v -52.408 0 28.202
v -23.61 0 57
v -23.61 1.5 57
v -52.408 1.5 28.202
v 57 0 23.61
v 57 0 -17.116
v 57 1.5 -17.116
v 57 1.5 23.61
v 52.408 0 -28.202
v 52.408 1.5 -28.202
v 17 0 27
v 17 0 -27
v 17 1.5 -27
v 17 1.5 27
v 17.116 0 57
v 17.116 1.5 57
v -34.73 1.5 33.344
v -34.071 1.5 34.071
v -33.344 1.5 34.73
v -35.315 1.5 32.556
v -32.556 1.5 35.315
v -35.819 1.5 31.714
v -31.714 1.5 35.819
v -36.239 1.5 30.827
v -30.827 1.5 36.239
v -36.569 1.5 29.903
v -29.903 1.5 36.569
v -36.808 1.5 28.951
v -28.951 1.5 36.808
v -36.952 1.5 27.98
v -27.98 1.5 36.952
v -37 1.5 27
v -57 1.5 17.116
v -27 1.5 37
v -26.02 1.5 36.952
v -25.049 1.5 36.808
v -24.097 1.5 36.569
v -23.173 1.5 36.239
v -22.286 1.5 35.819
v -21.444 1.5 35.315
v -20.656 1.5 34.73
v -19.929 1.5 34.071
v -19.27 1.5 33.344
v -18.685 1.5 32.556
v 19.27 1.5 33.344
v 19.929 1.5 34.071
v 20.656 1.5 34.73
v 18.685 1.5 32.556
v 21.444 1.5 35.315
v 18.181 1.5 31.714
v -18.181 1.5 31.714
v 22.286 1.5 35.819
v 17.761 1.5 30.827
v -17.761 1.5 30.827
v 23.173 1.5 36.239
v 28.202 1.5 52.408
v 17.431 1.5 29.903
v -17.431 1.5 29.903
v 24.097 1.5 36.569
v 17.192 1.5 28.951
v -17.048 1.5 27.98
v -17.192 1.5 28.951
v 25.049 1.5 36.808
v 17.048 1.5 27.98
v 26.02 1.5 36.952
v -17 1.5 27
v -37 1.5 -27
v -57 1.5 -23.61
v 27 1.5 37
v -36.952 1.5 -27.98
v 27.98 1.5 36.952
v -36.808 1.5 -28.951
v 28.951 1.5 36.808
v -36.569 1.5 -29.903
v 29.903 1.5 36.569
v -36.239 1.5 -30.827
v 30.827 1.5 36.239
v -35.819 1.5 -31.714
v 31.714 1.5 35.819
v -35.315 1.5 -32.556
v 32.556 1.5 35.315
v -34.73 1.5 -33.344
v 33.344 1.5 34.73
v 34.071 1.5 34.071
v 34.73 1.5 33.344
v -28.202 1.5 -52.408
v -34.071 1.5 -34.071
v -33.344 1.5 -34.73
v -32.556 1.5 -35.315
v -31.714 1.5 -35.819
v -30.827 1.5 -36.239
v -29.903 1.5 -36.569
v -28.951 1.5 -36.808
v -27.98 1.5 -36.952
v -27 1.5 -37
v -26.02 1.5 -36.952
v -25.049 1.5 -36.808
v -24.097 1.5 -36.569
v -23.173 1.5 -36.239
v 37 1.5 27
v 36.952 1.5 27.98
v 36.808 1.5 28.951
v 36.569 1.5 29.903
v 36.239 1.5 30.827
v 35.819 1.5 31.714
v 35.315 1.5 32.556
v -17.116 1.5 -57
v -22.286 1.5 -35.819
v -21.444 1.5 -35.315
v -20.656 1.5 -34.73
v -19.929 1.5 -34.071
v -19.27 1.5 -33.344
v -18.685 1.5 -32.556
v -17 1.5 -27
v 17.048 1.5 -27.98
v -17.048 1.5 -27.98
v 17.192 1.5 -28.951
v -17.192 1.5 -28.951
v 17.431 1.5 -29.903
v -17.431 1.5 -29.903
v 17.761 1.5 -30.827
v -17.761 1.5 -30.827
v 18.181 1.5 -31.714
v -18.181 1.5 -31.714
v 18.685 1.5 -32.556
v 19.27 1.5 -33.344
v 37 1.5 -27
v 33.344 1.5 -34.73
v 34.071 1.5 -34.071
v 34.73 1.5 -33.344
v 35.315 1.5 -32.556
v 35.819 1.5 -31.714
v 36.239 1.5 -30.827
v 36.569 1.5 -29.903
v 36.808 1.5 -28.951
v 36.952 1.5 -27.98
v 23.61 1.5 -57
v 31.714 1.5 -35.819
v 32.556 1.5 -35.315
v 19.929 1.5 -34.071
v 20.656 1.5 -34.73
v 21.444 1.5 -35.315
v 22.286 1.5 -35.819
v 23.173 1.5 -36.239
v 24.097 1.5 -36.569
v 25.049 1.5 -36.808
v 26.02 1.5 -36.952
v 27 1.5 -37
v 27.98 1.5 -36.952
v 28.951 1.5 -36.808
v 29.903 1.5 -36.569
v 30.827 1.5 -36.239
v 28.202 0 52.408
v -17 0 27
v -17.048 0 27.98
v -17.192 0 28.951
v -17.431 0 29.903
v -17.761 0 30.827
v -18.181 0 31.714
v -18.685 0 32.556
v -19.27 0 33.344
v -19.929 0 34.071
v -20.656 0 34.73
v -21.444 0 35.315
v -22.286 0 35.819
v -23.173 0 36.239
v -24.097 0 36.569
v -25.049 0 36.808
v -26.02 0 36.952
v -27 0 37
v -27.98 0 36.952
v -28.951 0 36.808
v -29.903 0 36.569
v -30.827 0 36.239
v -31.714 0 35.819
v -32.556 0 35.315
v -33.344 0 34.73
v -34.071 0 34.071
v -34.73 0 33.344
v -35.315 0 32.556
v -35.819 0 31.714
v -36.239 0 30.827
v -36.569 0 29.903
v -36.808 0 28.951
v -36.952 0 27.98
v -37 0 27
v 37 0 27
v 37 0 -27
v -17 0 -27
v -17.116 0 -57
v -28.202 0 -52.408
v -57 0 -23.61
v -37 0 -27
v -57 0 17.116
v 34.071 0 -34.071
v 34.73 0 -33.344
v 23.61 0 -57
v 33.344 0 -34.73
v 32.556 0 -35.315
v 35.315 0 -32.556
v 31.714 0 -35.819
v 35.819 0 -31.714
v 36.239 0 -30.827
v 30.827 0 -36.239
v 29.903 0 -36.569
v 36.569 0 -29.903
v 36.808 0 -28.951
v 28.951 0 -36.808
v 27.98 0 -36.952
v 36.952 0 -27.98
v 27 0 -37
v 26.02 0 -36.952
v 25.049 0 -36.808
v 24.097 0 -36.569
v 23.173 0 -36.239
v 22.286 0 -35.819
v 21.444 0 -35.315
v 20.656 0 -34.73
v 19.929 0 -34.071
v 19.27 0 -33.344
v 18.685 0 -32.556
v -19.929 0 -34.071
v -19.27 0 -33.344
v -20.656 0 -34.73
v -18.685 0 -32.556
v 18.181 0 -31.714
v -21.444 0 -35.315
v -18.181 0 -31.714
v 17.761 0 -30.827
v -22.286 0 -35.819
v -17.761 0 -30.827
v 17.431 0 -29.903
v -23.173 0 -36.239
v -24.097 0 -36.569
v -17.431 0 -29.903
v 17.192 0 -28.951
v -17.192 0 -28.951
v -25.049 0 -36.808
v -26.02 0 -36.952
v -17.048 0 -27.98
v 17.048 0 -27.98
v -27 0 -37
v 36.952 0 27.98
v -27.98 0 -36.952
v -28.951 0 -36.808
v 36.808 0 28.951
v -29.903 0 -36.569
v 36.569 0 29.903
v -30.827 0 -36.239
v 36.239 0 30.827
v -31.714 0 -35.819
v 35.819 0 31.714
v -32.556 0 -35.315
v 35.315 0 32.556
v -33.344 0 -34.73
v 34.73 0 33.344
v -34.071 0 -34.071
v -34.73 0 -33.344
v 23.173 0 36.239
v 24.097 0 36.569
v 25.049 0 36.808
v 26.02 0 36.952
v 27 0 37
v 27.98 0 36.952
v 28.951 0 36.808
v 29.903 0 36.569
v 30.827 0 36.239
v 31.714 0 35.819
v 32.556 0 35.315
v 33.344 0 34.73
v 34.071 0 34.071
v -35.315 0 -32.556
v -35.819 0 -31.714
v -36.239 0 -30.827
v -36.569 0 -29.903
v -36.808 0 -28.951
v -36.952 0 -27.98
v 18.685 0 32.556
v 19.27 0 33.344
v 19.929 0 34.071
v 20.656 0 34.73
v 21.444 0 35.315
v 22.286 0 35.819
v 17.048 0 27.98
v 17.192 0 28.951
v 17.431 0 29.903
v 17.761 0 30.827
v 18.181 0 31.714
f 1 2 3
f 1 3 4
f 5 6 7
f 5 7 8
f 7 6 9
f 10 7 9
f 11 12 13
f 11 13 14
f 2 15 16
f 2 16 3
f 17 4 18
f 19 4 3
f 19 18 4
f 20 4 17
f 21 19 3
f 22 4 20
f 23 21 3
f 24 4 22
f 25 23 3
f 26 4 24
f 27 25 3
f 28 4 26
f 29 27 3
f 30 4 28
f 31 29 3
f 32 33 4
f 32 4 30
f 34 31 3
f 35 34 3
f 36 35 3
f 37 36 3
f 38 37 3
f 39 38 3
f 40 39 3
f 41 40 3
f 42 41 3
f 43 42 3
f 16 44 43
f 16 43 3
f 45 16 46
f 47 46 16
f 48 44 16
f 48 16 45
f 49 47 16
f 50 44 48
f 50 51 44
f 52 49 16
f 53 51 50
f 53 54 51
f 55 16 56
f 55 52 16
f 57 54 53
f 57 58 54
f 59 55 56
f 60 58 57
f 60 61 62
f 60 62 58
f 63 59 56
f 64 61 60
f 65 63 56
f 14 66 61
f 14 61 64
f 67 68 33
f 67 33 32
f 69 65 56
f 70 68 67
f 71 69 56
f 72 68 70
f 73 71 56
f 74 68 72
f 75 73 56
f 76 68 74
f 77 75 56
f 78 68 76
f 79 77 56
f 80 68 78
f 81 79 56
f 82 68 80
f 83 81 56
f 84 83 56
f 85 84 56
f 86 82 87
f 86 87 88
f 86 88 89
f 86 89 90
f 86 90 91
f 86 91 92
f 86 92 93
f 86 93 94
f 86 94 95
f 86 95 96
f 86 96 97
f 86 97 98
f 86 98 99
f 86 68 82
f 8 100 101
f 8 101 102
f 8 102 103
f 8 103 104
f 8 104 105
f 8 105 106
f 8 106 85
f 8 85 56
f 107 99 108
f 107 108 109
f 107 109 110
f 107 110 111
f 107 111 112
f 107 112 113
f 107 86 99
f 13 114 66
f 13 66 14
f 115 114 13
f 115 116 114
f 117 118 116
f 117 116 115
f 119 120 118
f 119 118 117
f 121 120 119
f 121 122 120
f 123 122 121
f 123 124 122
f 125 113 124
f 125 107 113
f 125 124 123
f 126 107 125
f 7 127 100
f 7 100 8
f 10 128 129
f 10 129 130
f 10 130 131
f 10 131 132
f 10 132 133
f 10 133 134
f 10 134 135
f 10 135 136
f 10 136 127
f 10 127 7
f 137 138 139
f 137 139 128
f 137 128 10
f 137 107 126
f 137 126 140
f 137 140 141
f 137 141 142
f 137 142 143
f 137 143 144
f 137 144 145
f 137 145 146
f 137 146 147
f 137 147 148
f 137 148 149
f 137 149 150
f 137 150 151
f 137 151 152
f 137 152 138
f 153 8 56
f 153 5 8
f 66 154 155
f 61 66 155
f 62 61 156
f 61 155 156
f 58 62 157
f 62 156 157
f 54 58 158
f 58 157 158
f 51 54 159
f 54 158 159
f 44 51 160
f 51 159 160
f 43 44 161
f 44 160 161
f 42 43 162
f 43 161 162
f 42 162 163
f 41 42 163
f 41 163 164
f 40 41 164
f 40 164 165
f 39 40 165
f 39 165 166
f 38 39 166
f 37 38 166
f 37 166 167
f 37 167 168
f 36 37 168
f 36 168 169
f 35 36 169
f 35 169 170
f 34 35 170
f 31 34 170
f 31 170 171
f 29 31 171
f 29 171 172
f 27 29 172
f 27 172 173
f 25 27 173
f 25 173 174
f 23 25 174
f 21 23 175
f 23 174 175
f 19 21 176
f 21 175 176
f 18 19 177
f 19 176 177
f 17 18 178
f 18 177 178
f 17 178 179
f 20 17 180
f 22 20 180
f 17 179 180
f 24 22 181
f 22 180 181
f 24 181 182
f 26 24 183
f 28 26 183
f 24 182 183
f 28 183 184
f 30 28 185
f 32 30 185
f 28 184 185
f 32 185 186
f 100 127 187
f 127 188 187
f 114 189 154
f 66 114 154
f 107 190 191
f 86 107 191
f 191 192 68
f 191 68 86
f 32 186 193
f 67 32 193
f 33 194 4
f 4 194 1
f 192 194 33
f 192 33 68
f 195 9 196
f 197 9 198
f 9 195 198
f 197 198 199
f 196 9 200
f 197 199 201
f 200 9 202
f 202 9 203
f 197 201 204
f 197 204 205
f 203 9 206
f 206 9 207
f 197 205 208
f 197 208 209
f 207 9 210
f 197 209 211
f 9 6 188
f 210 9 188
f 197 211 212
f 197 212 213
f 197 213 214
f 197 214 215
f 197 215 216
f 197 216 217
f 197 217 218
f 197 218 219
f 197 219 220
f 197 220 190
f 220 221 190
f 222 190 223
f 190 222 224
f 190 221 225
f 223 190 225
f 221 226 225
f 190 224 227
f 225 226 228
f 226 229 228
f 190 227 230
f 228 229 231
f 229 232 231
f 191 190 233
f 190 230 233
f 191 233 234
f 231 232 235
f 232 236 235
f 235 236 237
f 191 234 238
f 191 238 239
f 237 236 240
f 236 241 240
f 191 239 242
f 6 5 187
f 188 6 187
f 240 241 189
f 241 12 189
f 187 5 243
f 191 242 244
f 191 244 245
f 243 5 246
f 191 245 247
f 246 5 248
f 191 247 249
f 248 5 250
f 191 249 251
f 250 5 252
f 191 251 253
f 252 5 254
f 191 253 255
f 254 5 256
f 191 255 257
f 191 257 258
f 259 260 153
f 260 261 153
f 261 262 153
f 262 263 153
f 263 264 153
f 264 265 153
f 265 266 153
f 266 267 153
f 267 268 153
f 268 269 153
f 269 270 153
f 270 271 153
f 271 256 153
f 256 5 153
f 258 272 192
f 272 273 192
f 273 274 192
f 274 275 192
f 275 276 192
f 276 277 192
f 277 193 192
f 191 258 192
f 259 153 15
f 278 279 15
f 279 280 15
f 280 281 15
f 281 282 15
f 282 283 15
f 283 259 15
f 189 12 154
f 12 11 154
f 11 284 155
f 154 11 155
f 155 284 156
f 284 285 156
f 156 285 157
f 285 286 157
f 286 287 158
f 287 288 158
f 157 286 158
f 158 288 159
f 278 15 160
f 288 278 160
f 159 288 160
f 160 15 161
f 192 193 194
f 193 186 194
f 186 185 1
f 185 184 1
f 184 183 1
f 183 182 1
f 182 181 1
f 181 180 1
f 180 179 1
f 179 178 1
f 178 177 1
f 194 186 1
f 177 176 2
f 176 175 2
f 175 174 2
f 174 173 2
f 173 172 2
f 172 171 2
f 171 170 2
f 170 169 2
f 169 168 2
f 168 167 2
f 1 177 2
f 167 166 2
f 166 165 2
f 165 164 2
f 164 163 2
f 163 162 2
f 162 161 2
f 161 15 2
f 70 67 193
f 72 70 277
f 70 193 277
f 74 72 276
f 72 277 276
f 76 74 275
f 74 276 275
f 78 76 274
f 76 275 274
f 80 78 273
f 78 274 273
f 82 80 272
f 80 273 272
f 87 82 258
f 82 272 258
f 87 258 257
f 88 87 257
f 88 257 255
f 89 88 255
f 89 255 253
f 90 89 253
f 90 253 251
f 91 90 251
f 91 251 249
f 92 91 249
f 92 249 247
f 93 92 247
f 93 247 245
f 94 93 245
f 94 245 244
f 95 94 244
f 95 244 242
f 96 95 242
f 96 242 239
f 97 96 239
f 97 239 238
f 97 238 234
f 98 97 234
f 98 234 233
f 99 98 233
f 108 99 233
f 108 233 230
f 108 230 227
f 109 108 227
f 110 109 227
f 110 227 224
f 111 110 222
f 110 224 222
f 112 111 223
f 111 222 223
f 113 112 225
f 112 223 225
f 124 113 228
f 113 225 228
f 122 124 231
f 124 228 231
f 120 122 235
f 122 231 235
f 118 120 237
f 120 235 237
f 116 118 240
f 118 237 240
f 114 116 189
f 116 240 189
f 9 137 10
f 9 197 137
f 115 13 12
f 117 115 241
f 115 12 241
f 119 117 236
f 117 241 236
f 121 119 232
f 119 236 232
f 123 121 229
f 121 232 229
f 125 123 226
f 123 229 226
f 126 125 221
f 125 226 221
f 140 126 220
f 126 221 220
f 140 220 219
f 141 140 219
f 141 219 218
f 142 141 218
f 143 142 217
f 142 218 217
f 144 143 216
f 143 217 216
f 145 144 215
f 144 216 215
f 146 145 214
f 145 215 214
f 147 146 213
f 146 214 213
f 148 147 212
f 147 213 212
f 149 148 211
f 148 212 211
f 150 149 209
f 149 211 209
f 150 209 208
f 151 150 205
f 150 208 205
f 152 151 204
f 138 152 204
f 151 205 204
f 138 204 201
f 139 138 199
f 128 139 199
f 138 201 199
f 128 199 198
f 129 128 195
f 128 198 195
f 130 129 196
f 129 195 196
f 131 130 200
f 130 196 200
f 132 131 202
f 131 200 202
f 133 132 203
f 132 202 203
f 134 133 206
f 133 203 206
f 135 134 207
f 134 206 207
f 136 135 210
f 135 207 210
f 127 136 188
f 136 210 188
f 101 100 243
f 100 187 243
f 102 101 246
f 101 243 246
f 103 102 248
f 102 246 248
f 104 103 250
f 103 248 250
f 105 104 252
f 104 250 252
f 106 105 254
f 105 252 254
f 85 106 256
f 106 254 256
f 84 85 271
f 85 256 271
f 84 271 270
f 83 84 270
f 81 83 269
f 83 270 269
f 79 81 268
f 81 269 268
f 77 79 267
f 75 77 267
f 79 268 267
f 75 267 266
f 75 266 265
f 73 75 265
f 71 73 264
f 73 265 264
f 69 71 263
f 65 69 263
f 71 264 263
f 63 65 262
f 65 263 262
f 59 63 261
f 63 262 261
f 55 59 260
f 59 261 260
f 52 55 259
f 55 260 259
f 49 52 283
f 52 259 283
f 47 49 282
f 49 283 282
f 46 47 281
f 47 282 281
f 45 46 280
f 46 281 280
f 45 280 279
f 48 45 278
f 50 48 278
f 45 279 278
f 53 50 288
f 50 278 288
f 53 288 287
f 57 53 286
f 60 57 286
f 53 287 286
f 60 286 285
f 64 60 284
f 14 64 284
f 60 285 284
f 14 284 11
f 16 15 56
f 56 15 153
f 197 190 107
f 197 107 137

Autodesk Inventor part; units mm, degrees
ref_plane "YZ Plane" through (0, 0, 0) normal (1, 0, 0) x (0, 1, 0)
ref_plane "XZ Plane" through (0, 0, 0) normal (0, 1, 0) x (-1, 0, 0)
ref_plane "XY Plane" through (0, 0, 0) normal (0, 0, 1) x (1, 0, 0)
sketch "Skizze4" plane through (0, 0, 0) normal (0, 1, 0) x (-1, 0, 0)
  line L0 (-23.6102, 57) -> (23.6102, 57)
  line L1 (23.6102, 57) -> (57, 23.6102)
  line L2 (57, 23.6102) -> (57, -23.6102)
  line L3 (57, -23.6102) -> (23.6102, -57)
  line L4 (23.6102, -57) -> (-23.6102, -57)
  line L5 (-23.6102, -57) -> (-57, -23.6102)
  line L6 (-57, -23.6102) -> (-57, 23.6102)
  line L7 (-57, 23.6102) -> (-23.6102, 57)
  line L8 (79.8, 0) -> (-79.8, 0) construction
  line L9 (0, -79.8) -> (0, 79.8) construction
  circle A0 centre (-27, 27) radius 10
  circle A1 centre (-27, -27) radius 10
  circle A2 centre (27, -27) radius 10
  circle A3 centre (27, 27) radius 10
  point P0 (0, 0)
  point P1 (0, 0)
  dimension "d4" = 114
  dimension "d5" = 20
  dimension "d6" = 30
  dimension "d7" = 30
  dimension "d10" = 360
extrude "Extrusion2" add sketch "Skizze4" along normal blind 2.5
sketch "Skizze5" plane through (0, 0, 0) normal (0, -1, 0) x (1, 0, 0)
  circle A0 centre (-27, 27) radius 10 construction
  circle A1 centre (-27, -27) radius 10 construction
  circle A2 centre (27, -27) radius 10 construction
  circle A3 centre (27, 27) radius 10 construction
  line L0 (23.6102, 57) -> (-23.6102, 57) construction
  line L1 (-23.6102, 57) -> (-57, 23.6102) construction
  line L2 (-57, 23.6102) -> (-57, -23.6102) construction
  line L3 (-57, -23.6102) -> (-23.6102, -57) construction
  line L4 (-23.6102, -57) -> (23.6102, -57) construction
  line L5 (23.6102, -57) -> (57, -23.6102) construction
  line L6 (57, -23.6102) -> (57, 23.6102) construction
  line L7 (57, 23.6102) -> (23.6102, 57) construction
  line L8 (23.6102, 57) -> (57, 23.6102) construction
  line L9 (-57, -23.6102) -> (-57, 23.6102) construction
  line L10 (-23.6102, -57) -> (-57, -23.6102) construction
  line L11 (23.6102, -57) -> (-23.6102, -57) construction
  line L12 (57, 23.6102) -> (57, -23.6102) construction
  line L13 (-57, 17.1158) -> (-52.4078, 28.2024)
  line L14 (-57, 23.6102) -> (-23.6102, 57) projected
  line L15 (-57, 23.6102) -> (-57, -23.6102) projected
  line L16 (-57, 23.6102) -> (-52.4078, 28.2024)
  line L17 (-23.6102, 57) -> (-57, 23.6102) projected
  line L18 (-57, 23.6102) -> (-57, 17.1158)
  line L19 (-23.6102, -57) -> (-28.2024, -52.4078)
  line L20 (-17.1158, -57) -> (-28.2024, -52.4078)
  line L21 (-23.6102, -57) -> (-17.1158, -57)
  line L22 (57, -23.6102) -> (52.4078, -28.2024)
  line L23 (57, -17.1158) -> (52.4078, -28.2024)
  line L24 (57, -23.6102) -> (57, -17.1158)
  line L25 (23.6102, 57) -> (28.2024, 52.4078)
  line L26 (17.1158, 57) -> (28.2024, 52.4078)
  line L27 (23.6102, 57) -> (17.1158, 57)
  point P0 (0, 0)
  dimension "d21" = 22.5
  dimension "d22" = 12
  dimension "d25" = 360
extrude "Extrusion3" cut sketch "Skizze5" against normal blind 10
sketch "Skizze6" plane through (0, 2.5, 0) normal (0, 1, 0) x (1, 0, 0)
  line L0 (57, 17.1158) -> (52.4078, 28.2024) projected
  line L1 (52.4078, 28.2024) -> (23.6102, 57) projected
  line L2 (23.6102, 57) -> (-17.1158, 57) projected
  line L3 (-17.1158, 57) -> (-28.2024, 52.4078) projected
  line L4 (-28.2024, 52.4078) -> (-57, 23.6102) projected
  line L5 (-57, 23.6102) -> (-57, -17.1158) projected
  line L6 (-57, -17.1158) -> (-52.4078, -28.2024) projected
  line L7 (-52.4078, -28.2024) -> (-23.6102, -57) projected
  line L8 (-23.6102, -57) -> (17.1158, -57) projected
  line L9 (17.1158, -57) -> (28.2024, -52.4078) projected
  line L10 (28.2024, -52.4078) -> (57, -23.6102) projected
  line L11 (57, -23.6102) -> (57, 17.1158) projected
  circle A0 centre (-27, -27) radius 10 projected
  circle A1 centre (-27, 27) radius 10 projected
  circle A2 centre (27, 27) radius 10 projected
  circle A3 centre (27, -27) radius 10 projected
  point P0 (0, 0)
extrude "Extrusion4" cut sketch "Skizze6" against normal blind 1
sketch "Skizze7" plane through (0, 0, 0) normal (0, -1, 0) x (1, 0, 0)
  line L0 (52.4078, -28.2024) -> (57, -17.1158) construction
  line L1 (57, -17.1158) -> (57, 23.6102) construction
  line L2 (57, 23.6102) -> (28.2024, 52.4078) construction
  line L3 (28.2024, 52.4078) -> (17.1158, 57) construction
  line L4 (17.1158, 57) -> (-23.6102, 57) construction
  line L5 (-23.6102, 57) -> (-52.4078, 28.2024) construction
  line L6 (-52.4078, 28.2024) -> (-57, 17.1158) construction
  line L7 (-57, 17.1158) -> (-57, -23.6102) construction
  line L8 (-57, -23.6102) -> (-28.2024, -52.4078) construction
  line L9 (-28.2024, -52.4078) -> (-17.1158, -57) construction
  line L10 (-17.1158, -57) -> (23.6102, -57) construction
  line L11 (23.6102, -57) -> (52.4078, -28.2024) construction
  circle A0 centre (-27, 27) radius 10 construction
  circle A1 centre (-27, -27) radius 10 construction
  circle A2 centre (27, -27) radius 10 construction
  circle A3 centre (27, 27) radius 10 construction
  line L12 (-37, 27) -> (-37, -27)
  circle A4 centre (-27, -27) radius 10 projected
  line L13 (-17, -27) -> (-17, 27)
  line L14 (37, -27) -> (37, 27)
  line L15 (17, -27) -> (17, 27)
  circle A5 centre (27, 27) radius 10 projected
  arc A6 (-17, 27) -> (-37, 27) centre (-27, 27) ccw
  arc A7 (37, 27) -> (17, 27) centre (27, 27) ccw
  circle A8 centre (27, -27) radius 10 projected
  arc A9 (17, -27) -> (37, -27) centre (27, -27) ccw
  circle A10 centre (-27, -27) radius 10 projected
  arc A11 (-37, -27) -> (-17, -27) centre (-27, -27) ccw
  point P0 (0, 0)
extrude "Extrusion5" cut sketch "Skizze7" against normal through all
equation "\"d7\" = d6"
properties part number "Stage2" material "3.3547 AlMg4,5Mn (AW-5083/H111)"
